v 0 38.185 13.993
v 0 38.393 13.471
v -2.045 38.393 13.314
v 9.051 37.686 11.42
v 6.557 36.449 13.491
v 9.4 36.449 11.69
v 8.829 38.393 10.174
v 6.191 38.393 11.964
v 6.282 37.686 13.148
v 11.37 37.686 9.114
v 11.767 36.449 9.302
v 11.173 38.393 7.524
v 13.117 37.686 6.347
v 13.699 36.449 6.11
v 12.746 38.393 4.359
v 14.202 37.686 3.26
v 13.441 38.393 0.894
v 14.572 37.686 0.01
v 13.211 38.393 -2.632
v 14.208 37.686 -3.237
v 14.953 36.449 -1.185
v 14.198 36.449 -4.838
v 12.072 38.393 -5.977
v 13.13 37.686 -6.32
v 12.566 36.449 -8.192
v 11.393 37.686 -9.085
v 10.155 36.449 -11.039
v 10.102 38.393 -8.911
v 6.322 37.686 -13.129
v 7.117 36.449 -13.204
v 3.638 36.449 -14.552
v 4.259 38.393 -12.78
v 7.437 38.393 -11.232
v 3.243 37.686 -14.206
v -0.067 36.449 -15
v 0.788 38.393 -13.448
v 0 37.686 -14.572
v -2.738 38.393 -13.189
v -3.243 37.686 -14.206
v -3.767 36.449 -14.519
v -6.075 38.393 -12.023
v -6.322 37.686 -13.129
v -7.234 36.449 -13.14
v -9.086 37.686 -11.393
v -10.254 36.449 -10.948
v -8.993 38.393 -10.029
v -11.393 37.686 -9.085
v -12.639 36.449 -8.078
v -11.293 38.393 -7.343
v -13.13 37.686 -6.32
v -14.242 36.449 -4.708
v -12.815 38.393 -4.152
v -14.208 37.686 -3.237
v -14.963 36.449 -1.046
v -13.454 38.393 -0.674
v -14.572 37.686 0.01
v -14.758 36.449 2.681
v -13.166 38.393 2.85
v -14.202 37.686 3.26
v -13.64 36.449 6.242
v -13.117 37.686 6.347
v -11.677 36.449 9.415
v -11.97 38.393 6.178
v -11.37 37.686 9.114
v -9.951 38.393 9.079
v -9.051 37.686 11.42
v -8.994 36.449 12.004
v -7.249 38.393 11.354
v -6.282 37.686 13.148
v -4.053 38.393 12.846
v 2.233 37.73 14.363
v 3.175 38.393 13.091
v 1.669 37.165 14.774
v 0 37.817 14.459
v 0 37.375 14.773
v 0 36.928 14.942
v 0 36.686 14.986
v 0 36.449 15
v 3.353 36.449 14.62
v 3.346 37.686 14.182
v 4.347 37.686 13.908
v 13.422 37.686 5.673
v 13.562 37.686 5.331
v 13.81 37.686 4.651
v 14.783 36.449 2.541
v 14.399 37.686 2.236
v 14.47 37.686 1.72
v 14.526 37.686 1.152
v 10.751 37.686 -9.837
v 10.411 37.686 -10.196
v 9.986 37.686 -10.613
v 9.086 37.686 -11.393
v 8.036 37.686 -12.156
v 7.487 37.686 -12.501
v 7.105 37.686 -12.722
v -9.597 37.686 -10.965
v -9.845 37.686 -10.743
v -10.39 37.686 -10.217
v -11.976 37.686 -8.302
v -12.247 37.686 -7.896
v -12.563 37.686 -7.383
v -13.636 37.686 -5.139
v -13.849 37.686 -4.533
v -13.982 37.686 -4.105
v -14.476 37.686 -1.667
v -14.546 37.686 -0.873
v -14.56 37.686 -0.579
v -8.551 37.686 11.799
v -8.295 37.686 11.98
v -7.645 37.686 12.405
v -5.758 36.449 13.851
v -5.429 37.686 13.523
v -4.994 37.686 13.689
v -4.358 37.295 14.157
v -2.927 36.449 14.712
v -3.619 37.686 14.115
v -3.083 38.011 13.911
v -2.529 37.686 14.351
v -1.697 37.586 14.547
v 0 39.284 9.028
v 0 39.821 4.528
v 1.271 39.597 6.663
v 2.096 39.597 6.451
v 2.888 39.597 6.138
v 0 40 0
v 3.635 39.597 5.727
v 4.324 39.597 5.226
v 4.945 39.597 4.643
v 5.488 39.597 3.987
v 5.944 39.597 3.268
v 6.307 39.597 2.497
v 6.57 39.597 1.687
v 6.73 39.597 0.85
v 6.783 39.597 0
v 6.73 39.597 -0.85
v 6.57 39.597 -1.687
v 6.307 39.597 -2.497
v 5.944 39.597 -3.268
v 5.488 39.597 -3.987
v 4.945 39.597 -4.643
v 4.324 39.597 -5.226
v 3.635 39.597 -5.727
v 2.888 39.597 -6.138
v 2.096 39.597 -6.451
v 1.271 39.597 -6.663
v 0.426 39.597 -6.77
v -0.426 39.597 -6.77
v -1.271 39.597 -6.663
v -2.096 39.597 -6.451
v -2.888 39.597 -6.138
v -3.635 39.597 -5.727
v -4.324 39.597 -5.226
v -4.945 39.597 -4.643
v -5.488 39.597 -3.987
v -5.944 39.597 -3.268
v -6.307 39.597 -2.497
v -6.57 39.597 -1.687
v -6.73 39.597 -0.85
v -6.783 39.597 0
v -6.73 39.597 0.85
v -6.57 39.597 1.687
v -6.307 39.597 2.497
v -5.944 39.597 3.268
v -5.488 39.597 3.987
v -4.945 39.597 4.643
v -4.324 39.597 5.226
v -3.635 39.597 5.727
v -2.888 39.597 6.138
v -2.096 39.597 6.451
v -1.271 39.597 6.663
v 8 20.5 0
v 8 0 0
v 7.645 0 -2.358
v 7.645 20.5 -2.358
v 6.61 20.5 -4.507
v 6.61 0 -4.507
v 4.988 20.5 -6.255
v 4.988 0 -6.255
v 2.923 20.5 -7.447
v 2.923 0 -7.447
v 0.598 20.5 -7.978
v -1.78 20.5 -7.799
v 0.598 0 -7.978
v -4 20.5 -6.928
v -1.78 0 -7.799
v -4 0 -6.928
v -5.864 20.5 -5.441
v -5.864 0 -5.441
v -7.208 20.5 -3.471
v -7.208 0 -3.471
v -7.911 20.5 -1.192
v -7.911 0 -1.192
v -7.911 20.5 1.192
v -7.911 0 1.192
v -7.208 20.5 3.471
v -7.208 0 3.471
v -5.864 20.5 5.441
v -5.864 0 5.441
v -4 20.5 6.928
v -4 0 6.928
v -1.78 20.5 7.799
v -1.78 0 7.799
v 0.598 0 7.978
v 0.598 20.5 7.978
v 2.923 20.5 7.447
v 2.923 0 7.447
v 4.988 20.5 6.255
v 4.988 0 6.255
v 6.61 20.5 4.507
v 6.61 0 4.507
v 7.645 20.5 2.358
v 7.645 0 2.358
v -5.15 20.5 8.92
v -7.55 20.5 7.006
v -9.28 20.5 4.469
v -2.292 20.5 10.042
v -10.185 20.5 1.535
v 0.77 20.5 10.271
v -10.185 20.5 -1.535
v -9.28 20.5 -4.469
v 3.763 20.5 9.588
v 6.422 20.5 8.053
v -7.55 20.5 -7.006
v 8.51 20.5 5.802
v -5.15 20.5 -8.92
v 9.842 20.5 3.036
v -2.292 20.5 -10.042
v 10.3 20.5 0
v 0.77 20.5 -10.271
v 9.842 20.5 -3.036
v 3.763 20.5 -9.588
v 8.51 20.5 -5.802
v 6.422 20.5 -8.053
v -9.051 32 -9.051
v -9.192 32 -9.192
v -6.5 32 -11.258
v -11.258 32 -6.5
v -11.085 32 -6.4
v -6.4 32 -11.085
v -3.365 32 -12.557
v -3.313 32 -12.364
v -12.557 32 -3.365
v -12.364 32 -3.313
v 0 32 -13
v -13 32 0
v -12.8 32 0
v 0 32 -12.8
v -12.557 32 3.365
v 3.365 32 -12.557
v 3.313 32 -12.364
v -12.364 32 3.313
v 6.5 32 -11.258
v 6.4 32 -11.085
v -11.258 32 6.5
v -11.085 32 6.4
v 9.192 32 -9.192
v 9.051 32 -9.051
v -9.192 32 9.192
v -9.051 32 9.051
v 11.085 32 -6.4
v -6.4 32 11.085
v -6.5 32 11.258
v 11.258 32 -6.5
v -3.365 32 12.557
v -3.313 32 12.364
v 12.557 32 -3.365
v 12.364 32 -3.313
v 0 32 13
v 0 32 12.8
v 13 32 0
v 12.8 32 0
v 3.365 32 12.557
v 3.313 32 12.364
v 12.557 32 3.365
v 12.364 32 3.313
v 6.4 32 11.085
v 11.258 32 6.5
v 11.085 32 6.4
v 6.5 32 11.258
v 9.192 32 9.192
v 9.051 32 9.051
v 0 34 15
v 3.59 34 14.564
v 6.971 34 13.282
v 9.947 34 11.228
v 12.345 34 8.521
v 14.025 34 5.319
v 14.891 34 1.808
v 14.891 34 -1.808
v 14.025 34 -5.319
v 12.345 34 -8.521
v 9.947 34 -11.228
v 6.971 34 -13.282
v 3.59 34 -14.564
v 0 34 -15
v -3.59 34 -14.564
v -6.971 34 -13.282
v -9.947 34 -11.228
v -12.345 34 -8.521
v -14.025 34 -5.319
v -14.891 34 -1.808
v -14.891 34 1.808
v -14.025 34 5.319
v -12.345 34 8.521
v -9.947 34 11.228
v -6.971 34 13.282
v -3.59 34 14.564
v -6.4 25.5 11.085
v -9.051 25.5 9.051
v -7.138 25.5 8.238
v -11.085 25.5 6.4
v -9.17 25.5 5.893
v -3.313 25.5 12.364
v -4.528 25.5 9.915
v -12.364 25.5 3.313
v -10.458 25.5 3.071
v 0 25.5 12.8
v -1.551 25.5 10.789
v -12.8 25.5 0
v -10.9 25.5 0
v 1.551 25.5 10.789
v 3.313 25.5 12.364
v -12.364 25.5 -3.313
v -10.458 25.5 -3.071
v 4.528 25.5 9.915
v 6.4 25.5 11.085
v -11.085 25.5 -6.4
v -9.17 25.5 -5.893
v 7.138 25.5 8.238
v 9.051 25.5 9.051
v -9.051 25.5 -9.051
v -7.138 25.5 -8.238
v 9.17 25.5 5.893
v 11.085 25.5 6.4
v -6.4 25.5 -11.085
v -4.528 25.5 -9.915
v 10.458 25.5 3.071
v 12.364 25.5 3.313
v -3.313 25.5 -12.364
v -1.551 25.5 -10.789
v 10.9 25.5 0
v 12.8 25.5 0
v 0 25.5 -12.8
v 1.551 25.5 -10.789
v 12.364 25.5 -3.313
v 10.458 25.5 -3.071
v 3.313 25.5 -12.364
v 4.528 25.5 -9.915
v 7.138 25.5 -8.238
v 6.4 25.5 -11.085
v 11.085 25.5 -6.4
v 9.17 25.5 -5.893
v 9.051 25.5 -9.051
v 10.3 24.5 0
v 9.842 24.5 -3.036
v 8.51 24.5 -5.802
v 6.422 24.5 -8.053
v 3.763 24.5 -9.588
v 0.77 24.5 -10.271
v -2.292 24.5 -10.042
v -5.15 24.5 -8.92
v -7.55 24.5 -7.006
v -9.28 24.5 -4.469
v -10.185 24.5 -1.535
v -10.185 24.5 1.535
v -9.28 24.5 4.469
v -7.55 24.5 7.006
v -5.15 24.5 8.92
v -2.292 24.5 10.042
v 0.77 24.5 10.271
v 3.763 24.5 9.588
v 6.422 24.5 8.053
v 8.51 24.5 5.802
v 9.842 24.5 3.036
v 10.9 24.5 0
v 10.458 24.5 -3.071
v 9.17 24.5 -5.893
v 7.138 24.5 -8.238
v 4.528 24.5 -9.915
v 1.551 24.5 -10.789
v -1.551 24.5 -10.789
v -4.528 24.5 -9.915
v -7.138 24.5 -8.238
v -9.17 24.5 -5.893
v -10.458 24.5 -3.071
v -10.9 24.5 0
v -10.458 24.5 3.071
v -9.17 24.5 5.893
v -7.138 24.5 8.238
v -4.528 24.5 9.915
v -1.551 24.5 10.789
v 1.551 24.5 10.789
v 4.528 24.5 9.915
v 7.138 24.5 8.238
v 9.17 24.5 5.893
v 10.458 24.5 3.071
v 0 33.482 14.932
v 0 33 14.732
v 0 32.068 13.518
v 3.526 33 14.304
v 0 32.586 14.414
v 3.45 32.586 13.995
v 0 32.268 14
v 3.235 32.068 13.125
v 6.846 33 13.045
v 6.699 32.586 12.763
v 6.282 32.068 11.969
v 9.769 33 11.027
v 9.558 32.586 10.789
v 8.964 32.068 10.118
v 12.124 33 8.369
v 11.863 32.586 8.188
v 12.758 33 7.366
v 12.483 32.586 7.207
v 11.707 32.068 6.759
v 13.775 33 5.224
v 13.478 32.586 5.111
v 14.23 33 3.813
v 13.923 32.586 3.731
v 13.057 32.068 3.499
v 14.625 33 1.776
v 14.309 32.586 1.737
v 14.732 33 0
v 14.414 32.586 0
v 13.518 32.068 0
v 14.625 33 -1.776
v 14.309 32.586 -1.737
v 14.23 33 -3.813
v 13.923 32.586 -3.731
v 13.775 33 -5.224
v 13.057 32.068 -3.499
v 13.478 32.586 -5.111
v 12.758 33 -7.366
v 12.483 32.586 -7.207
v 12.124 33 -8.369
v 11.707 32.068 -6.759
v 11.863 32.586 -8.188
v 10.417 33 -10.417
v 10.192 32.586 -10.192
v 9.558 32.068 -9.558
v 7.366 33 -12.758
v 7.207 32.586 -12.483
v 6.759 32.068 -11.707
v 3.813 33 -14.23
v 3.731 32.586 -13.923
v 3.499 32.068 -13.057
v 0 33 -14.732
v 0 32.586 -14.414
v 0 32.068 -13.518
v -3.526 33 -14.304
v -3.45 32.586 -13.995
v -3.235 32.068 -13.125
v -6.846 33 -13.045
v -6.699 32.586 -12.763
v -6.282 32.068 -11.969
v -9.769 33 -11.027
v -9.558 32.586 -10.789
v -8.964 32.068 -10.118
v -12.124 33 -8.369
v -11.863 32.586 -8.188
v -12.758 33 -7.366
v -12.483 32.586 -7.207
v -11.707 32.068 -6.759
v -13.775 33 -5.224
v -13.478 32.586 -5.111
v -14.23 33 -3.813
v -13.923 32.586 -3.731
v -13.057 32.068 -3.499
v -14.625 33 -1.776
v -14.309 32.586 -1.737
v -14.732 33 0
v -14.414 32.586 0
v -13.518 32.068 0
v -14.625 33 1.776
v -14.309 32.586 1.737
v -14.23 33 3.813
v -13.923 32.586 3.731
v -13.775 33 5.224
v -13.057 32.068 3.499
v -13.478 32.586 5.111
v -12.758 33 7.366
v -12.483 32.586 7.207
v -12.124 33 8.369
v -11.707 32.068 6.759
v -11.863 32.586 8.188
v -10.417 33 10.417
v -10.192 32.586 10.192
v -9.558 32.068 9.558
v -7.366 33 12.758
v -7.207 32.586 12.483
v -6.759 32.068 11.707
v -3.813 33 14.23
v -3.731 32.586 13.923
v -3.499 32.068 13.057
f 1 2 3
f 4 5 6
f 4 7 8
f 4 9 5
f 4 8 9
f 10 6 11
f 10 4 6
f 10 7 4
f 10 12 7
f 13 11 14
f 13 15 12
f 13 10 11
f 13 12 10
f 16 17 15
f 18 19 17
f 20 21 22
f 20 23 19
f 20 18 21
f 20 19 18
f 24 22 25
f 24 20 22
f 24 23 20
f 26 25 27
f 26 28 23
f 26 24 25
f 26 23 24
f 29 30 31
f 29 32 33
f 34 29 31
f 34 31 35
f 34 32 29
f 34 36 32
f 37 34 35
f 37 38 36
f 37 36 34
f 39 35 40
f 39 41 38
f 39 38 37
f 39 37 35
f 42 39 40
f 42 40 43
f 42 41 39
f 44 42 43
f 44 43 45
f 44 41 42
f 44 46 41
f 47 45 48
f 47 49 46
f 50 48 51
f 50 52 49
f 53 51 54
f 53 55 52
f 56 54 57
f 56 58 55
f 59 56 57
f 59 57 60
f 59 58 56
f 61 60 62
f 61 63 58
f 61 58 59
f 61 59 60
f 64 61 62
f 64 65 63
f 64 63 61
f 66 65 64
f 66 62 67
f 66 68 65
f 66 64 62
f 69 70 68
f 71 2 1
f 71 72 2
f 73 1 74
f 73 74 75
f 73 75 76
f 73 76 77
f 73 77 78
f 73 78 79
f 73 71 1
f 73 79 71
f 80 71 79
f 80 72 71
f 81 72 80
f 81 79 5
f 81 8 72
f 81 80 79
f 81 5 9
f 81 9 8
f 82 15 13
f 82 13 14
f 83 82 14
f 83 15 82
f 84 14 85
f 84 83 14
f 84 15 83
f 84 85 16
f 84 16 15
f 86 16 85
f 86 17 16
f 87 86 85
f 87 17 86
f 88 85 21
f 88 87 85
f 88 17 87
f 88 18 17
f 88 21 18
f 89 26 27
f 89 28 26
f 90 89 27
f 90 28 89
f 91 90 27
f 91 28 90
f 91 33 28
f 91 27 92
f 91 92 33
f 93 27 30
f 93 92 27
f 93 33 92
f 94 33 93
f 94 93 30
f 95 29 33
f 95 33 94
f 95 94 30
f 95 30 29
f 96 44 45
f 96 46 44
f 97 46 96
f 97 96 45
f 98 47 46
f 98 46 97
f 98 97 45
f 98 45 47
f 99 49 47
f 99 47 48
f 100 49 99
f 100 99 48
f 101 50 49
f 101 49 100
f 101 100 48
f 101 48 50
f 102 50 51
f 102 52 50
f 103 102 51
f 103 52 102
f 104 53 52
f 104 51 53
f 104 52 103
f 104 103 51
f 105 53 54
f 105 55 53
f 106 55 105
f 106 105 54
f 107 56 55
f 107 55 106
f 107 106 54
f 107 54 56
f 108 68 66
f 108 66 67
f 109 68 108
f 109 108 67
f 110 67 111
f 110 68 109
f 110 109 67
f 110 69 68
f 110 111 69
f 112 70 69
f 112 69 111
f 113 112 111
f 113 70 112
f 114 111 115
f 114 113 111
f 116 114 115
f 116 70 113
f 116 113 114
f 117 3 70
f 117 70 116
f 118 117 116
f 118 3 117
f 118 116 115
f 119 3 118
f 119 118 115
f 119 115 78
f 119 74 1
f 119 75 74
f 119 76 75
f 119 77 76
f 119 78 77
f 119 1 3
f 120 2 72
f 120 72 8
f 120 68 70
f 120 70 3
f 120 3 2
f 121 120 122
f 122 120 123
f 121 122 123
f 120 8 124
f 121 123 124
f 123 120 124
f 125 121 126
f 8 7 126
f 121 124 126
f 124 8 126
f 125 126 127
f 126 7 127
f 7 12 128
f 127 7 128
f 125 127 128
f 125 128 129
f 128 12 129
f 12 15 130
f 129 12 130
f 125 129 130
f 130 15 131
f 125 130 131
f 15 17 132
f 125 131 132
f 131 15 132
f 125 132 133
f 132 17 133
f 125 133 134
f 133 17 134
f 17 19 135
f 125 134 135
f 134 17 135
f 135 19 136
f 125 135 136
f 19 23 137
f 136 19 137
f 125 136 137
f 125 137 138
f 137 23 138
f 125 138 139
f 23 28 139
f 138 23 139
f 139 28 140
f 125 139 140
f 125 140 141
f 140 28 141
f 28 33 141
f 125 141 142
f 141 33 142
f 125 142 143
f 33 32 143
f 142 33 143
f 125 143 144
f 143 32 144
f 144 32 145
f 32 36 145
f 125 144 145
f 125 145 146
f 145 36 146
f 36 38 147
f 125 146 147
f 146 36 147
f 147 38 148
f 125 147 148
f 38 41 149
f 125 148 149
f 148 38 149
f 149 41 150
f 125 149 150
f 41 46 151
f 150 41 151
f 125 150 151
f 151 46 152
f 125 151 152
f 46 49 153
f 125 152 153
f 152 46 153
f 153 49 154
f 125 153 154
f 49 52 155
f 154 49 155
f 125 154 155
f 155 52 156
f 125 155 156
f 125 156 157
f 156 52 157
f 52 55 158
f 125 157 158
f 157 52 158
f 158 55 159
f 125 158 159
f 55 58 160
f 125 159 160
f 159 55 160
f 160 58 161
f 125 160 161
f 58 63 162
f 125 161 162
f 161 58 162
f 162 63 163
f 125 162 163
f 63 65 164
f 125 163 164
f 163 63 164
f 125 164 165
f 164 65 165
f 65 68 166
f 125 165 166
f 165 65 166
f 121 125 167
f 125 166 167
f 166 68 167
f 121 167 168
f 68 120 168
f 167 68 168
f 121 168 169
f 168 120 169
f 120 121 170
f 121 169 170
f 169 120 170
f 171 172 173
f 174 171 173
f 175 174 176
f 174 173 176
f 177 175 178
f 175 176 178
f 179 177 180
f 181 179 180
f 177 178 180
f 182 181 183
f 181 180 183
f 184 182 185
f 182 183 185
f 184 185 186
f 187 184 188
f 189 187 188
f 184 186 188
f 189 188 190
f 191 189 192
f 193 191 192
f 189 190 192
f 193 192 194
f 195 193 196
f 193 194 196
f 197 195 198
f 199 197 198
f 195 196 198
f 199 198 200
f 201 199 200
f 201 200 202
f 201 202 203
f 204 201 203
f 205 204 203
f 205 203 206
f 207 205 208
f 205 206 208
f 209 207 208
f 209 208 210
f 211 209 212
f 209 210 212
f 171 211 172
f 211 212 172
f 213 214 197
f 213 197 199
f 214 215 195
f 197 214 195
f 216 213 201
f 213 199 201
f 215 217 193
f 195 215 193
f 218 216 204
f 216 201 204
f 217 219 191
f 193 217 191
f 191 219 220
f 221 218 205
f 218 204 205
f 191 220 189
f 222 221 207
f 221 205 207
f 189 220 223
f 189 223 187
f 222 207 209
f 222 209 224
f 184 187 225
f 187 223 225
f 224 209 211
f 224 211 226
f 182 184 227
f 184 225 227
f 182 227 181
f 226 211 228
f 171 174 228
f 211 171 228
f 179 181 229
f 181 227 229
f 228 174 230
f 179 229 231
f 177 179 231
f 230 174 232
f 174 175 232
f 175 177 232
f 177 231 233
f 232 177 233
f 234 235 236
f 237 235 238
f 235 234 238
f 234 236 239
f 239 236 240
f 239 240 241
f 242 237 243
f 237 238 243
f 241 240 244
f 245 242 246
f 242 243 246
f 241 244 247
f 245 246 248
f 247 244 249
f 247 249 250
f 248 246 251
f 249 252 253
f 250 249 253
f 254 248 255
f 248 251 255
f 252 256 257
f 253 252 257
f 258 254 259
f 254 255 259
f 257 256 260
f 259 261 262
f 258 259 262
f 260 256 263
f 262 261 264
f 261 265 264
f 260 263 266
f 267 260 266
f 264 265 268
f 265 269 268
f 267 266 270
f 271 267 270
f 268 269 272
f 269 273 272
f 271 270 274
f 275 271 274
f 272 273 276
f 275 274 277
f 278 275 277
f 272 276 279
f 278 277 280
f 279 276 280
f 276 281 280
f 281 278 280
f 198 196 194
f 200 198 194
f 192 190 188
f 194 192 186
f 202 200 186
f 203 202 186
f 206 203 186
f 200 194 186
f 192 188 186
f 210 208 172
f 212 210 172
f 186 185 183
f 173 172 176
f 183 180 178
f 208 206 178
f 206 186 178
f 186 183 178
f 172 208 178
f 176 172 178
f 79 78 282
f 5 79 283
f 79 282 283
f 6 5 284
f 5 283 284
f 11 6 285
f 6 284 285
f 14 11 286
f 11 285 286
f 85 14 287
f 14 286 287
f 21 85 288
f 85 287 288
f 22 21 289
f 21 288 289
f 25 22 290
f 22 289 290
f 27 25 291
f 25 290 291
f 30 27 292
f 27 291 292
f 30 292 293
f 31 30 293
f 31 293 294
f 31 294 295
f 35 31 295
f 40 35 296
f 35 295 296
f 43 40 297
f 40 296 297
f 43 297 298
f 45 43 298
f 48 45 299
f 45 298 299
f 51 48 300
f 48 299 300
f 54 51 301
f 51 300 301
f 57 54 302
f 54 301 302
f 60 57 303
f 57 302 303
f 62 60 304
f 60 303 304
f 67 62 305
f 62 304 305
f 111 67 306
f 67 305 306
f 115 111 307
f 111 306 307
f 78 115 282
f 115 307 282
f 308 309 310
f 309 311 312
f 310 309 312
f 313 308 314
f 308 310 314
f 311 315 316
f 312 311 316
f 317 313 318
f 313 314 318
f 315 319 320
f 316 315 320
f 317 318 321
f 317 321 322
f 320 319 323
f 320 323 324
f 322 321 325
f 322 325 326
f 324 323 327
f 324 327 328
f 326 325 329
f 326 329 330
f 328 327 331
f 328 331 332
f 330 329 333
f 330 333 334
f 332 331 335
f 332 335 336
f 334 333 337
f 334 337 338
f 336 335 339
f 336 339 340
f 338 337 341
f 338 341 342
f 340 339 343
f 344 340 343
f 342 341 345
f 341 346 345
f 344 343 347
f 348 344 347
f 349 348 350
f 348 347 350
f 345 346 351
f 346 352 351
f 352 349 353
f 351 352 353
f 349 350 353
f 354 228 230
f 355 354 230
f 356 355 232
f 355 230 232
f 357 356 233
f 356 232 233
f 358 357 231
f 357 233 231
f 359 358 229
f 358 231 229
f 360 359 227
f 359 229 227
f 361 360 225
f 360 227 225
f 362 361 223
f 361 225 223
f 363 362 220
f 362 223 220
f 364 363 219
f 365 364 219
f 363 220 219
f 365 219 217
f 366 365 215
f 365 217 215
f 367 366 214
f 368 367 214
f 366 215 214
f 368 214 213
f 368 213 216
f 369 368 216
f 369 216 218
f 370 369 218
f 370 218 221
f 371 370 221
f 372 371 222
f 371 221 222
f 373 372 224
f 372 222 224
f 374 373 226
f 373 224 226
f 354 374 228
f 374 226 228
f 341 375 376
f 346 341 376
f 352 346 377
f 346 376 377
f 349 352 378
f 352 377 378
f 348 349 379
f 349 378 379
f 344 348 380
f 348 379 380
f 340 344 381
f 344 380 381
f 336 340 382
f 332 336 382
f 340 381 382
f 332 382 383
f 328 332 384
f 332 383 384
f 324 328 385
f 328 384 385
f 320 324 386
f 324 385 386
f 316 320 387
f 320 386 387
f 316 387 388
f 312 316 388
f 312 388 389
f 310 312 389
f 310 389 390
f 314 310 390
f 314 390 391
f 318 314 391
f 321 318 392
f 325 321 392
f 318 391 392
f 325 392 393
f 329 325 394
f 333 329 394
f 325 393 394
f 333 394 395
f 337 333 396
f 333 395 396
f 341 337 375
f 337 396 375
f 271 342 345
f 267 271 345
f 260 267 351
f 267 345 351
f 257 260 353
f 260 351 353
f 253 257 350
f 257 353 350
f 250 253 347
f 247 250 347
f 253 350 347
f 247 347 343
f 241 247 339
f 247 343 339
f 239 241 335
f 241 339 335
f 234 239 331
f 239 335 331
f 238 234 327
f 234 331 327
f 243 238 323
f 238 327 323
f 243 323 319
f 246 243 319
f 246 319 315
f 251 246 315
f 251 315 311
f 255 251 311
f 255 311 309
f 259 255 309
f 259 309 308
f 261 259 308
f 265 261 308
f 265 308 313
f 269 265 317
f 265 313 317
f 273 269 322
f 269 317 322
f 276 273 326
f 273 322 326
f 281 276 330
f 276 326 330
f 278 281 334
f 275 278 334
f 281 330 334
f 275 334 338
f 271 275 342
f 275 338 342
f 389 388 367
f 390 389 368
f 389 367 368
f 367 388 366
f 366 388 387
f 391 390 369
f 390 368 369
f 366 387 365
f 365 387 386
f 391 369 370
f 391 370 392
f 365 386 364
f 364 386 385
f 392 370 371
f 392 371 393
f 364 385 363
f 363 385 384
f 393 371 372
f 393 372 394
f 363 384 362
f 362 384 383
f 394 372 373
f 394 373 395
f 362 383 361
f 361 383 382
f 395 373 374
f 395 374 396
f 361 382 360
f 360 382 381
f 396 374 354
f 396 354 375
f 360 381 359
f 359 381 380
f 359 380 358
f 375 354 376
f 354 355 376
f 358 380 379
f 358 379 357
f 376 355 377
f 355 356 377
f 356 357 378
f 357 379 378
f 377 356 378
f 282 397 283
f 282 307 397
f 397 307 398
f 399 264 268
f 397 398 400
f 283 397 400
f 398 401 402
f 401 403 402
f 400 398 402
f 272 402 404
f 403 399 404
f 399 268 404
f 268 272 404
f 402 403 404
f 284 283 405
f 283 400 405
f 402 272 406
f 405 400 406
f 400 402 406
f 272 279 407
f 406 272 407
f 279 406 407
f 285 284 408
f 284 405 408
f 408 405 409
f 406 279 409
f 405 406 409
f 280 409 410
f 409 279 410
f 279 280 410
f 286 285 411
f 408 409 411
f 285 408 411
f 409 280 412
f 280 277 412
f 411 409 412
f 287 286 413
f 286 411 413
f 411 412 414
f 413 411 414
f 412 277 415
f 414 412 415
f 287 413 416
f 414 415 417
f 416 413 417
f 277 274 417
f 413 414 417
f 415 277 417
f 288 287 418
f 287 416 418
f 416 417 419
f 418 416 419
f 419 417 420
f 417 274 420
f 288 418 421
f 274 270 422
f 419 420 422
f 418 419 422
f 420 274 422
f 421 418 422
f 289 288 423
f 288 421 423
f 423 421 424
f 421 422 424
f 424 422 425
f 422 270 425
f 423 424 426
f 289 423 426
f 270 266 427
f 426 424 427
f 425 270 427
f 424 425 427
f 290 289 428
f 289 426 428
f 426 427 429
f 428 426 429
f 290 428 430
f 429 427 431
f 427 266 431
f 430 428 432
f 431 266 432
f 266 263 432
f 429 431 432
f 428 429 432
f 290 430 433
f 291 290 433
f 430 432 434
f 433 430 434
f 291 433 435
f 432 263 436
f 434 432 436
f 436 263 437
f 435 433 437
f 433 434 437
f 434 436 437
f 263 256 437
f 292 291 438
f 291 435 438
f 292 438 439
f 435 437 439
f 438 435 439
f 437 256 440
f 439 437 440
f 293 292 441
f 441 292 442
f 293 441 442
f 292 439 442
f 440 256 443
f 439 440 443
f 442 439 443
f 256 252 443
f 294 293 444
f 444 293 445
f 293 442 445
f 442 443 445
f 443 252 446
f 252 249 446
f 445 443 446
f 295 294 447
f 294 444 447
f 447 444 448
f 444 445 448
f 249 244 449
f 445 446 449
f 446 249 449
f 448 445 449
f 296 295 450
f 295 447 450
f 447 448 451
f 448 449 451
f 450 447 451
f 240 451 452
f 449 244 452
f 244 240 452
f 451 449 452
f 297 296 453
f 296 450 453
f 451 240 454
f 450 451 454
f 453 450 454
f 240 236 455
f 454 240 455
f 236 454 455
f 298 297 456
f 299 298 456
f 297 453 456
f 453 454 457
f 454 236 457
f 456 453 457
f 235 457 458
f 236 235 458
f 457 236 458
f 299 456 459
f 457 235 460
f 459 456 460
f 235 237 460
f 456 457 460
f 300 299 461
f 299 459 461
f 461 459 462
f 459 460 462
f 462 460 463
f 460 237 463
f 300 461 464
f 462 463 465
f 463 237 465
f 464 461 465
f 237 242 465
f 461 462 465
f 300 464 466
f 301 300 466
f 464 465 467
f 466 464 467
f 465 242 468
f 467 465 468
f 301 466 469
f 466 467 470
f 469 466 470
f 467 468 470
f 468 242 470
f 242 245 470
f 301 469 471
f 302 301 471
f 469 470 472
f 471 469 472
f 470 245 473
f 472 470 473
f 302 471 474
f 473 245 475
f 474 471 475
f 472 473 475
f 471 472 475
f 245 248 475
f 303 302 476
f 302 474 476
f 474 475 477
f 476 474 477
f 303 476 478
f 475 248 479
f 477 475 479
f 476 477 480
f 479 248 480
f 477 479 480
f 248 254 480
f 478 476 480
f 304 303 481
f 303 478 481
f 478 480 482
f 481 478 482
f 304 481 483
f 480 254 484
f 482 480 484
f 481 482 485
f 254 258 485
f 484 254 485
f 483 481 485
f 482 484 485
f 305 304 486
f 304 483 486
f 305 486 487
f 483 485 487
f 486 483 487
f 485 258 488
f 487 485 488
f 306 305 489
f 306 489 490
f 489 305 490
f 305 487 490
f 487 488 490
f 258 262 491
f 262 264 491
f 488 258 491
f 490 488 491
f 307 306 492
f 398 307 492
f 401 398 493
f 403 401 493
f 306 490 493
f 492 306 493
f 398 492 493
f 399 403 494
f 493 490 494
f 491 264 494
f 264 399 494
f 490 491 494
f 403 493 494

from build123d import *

# Parameters (mm, degrees)
SKETCH1_R           = 8
BOSS_EXTRUDE1_DEPTH = 20.5
SKETCH2_R           = 10.3
BOSS_EXTRUDE2_DEPTH = 4
SKETCH3_R           = 10.9
BOSS_EXTRUDE3_DEPTH = 1
SKETCH4_R           = 12.8
BOSS_EXTRUDE4_DEPTH = 6.5
FILLET1_R           = 2


with BuildPart() as part:
    # Sketch1 → Boss-Extrude1 (new body)
    with BuildSketch(Plane(origin=(0, 0, 0), x_dir=(1, 0, 0), z_dir=(0, 1, 0))):
        Circle(SKETCH1_R)
    extrude(amount=BOSS_EXTRUDE1_DEPTH)

    # Sketch2 → Boss-Extrude2 (add)
    with BuildSketch(Plane(origin=(0, 20.5, 0), x_dir=(1, 0, 0), z_dir=(0, 1, 0))):
        Circle(SKETCH2_R)
    extrude(amount=BOSS_EXTRUDE2_DEPTH)

    # Sketch3 → Boss-Extrude3 (add)
    with BuildSketch(Plane(origin=(0, 24.5, 0), x_dir=(1, 0, 0), z_dir=(0, 1, 0))):
        Circle(SKETCH3_R)
    extrude(amount=BOSS_EXTRUDE3_DEPTH)

    # Sketch4 → Boss-Extrude4 (add)
    with BuildSketch(Plane(origin=(0, 25.5, 0), x_dir=(1, 0, 0), z_dir=(0, 1, 0))):
        Circle(SKETCH4_R)
    extrude(amount=BOSS_EXTRUDE4_DEPTH)

    # Sketch5 → Revolve1 (revolve)
    with BuildSketch(Plane(origin=(0, 0, 0), x_dir=(0, 0, -1), z_dir=(1, 0, 0))):
        with BuildLine():
            Line((0, 32), (0, 40))
            ThreePointArc((0, 40), (-7.566372975, 39.497797314), (-15, 38))
            Line((-15, 38), (-15, 32))
            Line((-15, 32), (-12.8, 32))
            Line((-12.8, 32), (0, 32))
        make_face()
    revolve(axis=Axis((0, 32, 0), (0, 1, 0)))

    # Fillet1
    fillet1_edges = [part.edges().sort_by_distance(p)[0] for p in [
        (0, 38, -15),
        (0, 32, -15),
    ]]
    fillet(fillet1_edges, radius=FILLET1_R)


solid = part.part
